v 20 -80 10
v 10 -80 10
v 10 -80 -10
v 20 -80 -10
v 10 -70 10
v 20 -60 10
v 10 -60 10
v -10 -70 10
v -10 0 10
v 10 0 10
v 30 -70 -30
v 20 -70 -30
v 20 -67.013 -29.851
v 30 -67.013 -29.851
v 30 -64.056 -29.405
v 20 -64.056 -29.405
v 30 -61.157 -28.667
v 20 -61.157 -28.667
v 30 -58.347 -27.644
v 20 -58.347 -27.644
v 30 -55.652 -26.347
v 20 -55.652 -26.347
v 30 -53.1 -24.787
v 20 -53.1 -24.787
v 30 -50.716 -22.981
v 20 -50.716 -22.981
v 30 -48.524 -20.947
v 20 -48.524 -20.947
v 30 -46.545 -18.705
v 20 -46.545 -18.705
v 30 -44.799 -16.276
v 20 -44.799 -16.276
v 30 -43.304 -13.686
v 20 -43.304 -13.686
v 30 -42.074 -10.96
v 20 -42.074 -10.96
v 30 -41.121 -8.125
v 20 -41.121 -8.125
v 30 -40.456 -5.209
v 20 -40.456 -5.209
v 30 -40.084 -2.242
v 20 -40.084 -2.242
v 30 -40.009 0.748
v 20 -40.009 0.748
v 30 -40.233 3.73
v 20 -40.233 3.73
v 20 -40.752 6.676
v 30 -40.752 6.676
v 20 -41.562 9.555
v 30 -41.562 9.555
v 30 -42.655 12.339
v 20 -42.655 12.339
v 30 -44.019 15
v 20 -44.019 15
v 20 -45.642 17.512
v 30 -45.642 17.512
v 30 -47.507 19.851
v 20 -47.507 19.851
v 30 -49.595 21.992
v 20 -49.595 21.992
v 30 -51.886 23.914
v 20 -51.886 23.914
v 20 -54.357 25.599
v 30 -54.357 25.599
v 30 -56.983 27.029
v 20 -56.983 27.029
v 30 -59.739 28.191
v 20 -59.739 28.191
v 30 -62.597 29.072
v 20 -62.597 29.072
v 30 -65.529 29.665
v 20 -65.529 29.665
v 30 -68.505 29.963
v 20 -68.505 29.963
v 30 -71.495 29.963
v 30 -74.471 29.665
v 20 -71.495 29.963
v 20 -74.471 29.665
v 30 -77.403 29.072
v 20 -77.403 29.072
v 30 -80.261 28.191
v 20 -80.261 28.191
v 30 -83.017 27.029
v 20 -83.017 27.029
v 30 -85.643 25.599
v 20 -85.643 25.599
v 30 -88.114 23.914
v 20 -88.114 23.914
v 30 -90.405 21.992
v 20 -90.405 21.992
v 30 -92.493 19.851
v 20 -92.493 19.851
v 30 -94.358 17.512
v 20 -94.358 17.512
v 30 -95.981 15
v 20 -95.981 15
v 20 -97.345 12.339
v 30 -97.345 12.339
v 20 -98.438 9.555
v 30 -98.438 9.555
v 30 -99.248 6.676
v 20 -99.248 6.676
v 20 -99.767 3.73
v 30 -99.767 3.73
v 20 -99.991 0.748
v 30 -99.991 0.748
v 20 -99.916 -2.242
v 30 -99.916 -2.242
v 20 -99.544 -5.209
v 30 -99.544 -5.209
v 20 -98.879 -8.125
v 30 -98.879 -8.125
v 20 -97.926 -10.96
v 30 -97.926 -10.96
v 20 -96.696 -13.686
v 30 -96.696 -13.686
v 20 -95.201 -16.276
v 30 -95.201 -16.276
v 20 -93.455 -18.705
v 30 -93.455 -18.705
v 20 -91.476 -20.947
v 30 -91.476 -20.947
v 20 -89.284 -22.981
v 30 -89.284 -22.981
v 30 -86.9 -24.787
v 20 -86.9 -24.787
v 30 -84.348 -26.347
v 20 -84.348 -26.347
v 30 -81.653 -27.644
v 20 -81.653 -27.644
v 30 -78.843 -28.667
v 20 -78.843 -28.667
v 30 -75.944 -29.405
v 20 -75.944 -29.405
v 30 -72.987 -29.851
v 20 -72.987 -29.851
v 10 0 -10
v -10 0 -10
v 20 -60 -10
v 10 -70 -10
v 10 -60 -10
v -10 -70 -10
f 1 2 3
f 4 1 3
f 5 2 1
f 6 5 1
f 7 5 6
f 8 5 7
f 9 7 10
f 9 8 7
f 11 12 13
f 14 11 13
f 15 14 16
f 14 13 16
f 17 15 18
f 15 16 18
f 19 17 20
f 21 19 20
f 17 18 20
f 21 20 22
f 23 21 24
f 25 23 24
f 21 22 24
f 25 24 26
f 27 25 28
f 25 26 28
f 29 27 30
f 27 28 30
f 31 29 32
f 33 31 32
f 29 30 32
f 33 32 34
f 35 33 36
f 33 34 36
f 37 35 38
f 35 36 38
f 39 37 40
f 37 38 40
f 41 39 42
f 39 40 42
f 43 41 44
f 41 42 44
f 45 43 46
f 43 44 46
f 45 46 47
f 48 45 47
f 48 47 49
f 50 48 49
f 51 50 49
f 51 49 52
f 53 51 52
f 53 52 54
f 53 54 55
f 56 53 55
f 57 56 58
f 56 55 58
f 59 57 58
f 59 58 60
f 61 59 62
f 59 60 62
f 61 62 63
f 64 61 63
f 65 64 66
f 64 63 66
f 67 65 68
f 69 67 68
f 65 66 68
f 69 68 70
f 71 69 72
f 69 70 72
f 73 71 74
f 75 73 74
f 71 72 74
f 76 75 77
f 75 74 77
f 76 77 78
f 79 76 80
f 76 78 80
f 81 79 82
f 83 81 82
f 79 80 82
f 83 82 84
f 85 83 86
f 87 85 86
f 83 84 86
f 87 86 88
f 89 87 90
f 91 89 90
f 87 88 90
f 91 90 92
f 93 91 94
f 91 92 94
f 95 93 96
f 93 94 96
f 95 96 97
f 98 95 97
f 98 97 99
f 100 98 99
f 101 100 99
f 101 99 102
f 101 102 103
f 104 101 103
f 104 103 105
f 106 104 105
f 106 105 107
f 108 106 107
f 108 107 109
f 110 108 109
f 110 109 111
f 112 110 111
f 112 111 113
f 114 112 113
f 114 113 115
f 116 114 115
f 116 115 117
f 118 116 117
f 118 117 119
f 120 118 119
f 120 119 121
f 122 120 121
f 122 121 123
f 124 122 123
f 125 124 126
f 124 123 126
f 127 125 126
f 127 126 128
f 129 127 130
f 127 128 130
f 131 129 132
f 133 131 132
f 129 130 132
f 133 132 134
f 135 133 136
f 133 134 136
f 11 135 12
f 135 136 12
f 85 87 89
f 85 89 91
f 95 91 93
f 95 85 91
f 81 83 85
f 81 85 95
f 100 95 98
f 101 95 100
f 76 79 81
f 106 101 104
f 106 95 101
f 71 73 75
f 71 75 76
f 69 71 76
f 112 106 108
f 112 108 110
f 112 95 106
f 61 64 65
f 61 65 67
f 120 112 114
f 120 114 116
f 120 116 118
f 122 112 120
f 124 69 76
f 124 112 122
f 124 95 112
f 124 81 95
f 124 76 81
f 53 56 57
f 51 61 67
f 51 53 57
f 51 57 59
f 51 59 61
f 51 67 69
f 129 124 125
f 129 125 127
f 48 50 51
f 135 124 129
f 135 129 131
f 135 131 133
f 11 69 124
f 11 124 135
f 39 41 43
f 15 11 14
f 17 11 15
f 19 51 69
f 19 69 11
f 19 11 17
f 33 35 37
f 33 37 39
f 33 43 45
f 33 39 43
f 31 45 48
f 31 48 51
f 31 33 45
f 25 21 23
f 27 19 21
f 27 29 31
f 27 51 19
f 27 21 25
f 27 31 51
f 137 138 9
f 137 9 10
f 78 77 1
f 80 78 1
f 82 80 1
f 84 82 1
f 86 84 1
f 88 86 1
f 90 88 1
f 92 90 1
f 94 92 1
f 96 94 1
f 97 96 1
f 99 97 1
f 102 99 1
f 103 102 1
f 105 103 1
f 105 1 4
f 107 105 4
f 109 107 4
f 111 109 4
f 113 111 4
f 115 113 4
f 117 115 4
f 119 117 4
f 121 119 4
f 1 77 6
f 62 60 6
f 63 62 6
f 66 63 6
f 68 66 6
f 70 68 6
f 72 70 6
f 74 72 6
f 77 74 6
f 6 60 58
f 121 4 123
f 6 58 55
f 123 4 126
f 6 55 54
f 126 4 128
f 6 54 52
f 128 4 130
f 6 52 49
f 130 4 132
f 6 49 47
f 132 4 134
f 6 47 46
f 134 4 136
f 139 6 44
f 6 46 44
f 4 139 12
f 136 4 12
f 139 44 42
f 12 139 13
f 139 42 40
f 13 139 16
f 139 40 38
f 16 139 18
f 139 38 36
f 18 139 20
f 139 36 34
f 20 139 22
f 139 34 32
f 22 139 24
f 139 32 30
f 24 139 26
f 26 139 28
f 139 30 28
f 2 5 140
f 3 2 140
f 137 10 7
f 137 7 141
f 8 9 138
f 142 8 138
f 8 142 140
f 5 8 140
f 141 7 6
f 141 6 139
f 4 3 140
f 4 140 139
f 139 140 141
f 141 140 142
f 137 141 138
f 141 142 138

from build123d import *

# Parameters (mm, degrees)
SKETCH_1_W      = 20
SKETCH_1_H      = 20
EXTRUDE_1_DEPTH = 70
SKETCH_2_W      = 20
SKETCH_2_H      = 20
EXTRUDE_2_DEPTH = 10
SKETCH_4_R      = 30
SKETCH_4_R_2    = 25
EXTRUDE_5_DEPTH = 10
SKETCH_6_R      = 25
EXTRUDE_6_DEPTH = 10


with BuildPart() as part:
    # 草图1 → 凸台-拉伸1 (new body)
    with BuildSketch(Plane(origin=(0, 0, 0), x_dir=(1, 0, 0), z_dir=(0, 1, 0))):
        Rectangle(SKETCH_1_W, SKETCH_1_H)
    extrude(amount=-EXTRUDE_1_DEPTH)

    # 草图2 → 凸台-拉伸2 (add)
    with BuildSketch(Plane(origin=(10, 0, 0), x_dir=(0, 0, -1), z_dir=(1, 0, 0))):
        with Locations((0, -70)):
            Rectangle(SKETCH_2_W, SKETCH_2_H)
    extrude(amount=EXTRUDE_2_DEPTH)



with BuildPart() as body_2:
    # 草图4 → 凸台-拉伸5 (new body)
    with BuildSketch(Plane(origin=(20, 0, 0), x_dir=(0, 0, -1), z_dir=(1, 0, 0))):
        with Locations((0, -70)):
            Circle(SKETCH_4_R)
        with Locations((0, -70)):
            Circle(SKETCH_4_R_2, mode=Mode.SUBTRACT)
    extrude(amount=EXTRUDE_5_DEPTH)


with BuildPart() as part_1:
    add(part.part)

    add(body_2.part)  # 凸台-拉伸6 merges body 2
    # 草图6 → 凸台-拉伸6 (add)
    with BuildSketch(Plane(origin=(20, 0, 0), x_dir=(0, 0, -1), z_dir=(1, 0, 0))):
        with Locations((0, -70)):
            Circle(SKETCH_6_R)
    extrude(amount=EXTRUDE_6_DEPTH)


solid = part_1.part
